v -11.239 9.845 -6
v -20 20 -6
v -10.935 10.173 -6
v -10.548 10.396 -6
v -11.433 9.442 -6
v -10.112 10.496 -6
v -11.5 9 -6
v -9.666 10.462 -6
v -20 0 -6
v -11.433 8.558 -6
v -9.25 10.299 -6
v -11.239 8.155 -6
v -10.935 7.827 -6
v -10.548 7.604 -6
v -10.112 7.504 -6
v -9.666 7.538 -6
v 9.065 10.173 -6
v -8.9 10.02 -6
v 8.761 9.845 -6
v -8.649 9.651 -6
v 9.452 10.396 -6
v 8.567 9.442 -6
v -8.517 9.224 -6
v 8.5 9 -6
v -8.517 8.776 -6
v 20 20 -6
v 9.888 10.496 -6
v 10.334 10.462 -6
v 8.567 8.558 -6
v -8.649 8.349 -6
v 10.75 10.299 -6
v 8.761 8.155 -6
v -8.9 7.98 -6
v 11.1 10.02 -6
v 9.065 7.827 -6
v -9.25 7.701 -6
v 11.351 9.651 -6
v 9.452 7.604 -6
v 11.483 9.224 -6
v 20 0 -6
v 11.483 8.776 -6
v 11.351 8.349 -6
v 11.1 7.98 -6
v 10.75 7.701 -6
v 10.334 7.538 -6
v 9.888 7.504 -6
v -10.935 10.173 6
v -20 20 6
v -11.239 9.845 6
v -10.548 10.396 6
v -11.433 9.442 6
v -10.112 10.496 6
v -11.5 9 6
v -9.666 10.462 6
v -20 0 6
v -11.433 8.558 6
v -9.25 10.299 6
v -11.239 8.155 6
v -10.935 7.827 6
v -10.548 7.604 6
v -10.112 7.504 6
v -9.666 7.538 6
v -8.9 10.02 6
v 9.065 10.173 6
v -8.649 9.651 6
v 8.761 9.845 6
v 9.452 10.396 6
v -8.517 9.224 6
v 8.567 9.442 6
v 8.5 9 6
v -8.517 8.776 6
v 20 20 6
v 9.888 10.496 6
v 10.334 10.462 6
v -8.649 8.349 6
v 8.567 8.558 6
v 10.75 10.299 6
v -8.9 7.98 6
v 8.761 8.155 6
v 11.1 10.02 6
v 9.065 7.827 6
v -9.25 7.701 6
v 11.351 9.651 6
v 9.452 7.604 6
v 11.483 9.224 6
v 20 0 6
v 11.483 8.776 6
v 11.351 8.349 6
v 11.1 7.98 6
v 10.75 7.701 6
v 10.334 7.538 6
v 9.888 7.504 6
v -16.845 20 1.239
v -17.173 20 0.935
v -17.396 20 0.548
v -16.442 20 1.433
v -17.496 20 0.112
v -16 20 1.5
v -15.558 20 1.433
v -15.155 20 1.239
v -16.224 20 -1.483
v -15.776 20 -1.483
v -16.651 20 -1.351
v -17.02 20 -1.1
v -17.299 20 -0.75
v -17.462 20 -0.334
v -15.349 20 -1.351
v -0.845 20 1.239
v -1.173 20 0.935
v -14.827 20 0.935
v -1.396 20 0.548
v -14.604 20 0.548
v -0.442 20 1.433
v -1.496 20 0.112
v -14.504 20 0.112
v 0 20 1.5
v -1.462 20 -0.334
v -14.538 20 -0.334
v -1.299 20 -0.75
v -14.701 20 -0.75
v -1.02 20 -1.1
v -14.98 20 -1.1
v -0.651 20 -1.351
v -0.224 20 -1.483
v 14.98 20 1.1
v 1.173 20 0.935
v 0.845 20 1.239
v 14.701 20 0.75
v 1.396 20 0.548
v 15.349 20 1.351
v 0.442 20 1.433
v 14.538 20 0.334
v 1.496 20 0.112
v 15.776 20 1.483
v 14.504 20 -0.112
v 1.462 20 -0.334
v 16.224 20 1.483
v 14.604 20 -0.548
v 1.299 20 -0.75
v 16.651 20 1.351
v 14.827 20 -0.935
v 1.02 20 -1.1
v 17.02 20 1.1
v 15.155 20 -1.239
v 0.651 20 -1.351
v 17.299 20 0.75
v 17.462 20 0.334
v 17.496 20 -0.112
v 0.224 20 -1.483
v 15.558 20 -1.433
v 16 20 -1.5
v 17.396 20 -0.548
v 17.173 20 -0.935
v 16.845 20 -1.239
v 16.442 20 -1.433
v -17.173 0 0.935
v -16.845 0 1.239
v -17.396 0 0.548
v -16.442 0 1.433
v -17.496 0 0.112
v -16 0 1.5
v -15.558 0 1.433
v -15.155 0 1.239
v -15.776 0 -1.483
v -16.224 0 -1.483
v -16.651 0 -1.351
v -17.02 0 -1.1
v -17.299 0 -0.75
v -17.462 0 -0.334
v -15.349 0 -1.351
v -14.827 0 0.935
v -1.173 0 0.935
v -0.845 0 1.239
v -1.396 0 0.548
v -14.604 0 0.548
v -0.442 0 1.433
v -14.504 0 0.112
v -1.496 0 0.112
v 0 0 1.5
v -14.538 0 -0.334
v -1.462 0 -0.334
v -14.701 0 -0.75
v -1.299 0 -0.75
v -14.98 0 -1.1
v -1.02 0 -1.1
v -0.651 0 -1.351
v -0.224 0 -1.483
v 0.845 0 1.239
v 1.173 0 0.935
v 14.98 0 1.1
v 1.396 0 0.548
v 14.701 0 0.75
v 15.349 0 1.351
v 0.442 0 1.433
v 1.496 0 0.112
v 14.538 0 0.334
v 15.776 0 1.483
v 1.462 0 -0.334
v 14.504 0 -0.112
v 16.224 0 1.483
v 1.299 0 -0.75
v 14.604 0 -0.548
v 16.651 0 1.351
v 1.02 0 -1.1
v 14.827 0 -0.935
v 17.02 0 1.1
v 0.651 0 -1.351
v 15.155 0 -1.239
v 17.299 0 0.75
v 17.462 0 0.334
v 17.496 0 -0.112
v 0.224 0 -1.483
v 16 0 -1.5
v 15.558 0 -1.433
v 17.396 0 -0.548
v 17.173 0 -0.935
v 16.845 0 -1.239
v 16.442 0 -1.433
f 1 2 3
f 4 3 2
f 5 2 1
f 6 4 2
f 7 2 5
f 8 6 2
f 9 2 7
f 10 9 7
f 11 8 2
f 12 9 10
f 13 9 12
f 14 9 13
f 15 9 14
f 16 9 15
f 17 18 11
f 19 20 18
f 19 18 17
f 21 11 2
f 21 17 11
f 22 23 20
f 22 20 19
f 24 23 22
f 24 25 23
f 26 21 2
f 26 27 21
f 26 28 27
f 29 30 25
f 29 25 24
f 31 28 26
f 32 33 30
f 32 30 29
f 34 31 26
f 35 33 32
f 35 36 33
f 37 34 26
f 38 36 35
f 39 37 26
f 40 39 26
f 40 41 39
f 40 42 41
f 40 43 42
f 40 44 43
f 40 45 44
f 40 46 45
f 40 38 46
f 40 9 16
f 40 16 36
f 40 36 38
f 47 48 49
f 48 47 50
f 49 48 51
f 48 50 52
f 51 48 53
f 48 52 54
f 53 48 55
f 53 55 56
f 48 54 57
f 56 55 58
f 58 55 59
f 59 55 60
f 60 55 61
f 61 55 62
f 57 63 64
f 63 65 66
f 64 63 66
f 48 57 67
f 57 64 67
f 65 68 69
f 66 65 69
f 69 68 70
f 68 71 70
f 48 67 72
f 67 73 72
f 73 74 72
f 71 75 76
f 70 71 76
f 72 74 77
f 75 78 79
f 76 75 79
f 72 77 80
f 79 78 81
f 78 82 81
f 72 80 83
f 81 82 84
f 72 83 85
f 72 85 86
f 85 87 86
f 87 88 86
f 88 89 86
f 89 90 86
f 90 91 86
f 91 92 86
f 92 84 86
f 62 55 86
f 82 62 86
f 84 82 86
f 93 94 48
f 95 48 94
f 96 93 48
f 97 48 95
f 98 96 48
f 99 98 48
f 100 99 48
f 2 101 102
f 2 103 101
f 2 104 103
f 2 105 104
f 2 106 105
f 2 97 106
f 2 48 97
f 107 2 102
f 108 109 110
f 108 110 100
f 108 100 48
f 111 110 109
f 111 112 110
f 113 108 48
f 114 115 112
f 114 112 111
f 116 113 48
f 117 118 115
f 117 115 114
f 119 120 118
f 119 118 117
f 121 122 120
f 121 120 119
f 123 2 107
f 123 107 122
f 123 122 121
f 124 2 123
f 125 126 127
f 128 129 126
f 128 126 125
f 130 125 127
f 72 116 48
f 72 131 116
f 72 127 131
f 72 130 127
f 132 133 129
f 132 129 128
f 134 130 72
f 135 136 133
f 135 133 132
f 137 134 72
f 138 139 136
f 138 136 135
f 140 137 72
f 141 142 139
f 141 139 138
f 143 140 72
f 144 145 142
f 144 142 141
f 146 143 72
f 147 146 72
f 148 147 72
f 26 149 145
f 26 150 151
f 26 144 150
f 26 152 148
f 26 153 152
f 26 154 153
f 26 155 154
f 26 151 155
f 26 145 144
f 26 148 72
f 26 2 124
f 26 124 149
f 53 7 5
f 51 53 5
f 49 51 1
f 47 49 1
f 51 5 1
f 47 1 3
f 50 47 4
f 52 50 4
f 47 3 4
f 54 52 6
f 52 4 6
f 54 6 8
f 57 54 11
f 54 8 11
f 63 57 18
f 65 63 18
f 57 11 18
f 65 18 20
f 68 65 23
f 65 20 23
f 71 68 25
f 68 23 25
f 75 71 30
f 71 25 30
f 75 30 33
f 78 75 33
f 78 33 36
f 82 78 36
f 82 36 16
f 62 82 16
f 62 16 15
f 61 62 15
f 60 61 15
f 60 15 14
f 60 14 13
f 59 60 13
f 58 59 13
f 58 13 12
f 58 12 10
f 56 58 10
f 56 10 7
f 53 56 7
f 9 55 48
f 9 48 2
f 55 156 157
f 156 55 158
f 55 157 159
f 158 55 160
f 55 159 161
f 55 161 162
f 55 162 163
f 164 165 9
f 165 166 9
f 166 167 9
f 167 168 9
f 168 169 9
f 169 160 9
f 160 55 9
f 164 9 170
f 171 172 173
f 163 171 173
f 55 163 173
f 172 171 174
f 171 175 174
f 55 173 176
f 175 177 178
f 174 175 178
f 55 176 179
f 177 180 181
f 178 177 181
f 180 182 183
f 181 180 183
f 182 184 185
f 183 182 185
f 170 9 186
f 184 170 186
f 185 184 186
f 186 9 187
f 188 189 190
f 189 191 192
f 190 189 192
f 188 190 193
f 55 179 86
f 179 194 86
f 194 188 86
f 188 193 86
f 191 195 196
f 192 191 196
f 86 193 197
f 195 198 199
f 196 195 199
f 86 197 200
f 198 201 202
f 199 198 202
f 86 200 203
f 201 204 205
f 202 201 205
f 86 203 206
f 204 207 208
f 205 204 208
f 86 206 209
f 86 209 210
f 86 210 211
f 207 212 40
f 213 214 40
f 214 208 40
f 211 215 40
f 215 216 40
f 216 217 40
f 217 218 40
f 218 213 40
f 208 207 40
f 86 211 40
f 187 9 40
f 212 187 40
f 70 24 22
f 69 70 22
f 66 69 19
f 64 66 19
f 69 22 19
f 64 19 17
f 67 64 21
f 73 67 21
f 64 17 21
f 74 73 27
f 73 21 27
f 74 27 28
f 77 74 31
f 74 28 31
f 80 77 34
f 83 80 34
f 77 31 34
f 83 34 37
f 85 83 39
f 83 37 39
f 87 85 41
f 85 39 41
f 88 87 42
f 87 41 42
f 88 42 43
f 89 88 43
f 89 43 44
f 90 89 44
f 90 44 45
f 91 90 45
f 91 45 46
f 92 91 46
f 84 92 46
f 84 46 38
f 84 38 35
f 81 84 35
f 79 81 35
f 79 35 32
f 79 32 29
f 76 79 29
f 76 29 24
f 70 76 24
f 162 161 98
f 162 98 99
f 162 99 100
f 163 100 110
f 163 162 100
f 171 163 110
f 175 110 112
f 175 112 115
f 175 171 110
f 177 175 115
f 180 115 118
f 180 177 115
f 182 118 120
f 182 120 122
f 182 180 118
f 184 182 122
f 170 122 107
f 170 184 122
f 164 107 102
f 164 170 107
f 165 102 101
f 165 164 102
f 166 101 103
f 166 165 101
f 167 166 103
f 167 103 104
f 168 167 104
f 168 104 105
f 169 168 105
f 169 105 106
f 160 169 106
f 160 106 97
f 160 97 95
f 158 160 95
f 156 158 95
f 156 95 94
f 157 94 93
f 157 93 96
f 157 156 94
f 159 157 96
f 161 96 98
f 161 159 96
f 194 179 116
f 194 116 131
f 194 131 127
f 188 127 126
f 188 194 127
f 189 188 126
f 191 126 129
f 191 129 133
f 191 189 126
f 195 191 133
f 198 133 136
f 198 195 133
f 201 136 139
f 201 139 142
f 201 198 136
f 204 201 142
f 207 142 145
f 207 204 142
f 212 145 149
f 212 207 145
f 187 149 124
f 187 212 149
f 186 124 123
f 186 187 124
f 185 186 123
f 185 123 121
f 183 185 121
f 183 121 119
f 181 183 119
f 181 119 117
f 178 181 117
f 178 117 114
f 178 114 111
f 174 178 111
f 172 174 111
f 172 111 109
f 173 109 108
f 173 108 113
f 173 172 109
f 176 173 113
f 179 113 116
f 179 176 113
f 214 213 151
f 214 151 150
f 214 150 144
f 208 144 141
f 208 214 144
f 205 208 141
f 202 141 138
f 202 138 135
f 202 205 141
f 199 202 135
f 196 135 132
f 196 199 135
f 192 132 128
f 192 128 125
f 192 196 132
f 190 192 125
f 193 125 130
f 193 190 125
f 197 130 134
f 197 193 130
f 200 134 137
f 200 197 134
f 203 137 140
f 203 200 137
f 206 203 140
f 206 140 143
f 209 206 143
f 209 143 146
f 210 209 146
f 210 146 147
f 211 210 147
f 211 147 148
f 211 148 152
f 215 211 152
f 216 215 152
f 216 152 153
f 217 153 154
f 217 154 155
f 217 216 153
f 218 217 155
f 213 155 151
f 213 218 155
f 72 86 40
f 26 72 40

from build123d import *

# Parameters (mm, degrees)
SKETCH1_W           = 40
SKETCH1_H           = 12
SKETCH1_R           = 1.5
BOSS_EXTRUDE1_DEPTH = 20
SKETCH2_R           = 1.5
CUT_EXTRUDE1_DEPTH  = 20


with BuildPart() as part:
    # Sketch1 → Boss-Extrude1 (new body)
    with BuildSketch(Plane(origin=(0, 0, 0), x_dir=(1, 0, 0), z_dir=(0, 1, 0))):
        Rectangle(SKETCH1_W, SKETCH1_H)
        with Locations(Location((0, 0, 0), (0, 0, 270))):
            Circle(SKETCH1_R, mode=Mode.SUBTRACT)
        with Locations(Location((-16, 0, 0), (0, 0, 270))):
            Circle(SKETCH1_R, mode=Mode.SUBTRACT)
        with Locations(Location((16, 0, 0), (0, 0, 90))):
            Circle(SKETCH1_R, mode=Mode.SUBTRACT)
    extrude(amount=BOSS_EXTRUDE1_DEPTH)

    # Sketch2 → Cut-Extrude1 (cut)
    with BuildSketch(Plane(origin=(0, 0, -6), x_dir=(-1, 0, 0), z_dir=(0, 0, -1))):
        with Locations((10, 9)):
            Circle(SKETCH2_R)
        with Locations((-10, 9)):
            Circle(SKETCH2_R)
    extrude(amount=-CUT_EXTRUDE1_DEPTH, mode=Mode.SUBTRACT)


solid = part.part
